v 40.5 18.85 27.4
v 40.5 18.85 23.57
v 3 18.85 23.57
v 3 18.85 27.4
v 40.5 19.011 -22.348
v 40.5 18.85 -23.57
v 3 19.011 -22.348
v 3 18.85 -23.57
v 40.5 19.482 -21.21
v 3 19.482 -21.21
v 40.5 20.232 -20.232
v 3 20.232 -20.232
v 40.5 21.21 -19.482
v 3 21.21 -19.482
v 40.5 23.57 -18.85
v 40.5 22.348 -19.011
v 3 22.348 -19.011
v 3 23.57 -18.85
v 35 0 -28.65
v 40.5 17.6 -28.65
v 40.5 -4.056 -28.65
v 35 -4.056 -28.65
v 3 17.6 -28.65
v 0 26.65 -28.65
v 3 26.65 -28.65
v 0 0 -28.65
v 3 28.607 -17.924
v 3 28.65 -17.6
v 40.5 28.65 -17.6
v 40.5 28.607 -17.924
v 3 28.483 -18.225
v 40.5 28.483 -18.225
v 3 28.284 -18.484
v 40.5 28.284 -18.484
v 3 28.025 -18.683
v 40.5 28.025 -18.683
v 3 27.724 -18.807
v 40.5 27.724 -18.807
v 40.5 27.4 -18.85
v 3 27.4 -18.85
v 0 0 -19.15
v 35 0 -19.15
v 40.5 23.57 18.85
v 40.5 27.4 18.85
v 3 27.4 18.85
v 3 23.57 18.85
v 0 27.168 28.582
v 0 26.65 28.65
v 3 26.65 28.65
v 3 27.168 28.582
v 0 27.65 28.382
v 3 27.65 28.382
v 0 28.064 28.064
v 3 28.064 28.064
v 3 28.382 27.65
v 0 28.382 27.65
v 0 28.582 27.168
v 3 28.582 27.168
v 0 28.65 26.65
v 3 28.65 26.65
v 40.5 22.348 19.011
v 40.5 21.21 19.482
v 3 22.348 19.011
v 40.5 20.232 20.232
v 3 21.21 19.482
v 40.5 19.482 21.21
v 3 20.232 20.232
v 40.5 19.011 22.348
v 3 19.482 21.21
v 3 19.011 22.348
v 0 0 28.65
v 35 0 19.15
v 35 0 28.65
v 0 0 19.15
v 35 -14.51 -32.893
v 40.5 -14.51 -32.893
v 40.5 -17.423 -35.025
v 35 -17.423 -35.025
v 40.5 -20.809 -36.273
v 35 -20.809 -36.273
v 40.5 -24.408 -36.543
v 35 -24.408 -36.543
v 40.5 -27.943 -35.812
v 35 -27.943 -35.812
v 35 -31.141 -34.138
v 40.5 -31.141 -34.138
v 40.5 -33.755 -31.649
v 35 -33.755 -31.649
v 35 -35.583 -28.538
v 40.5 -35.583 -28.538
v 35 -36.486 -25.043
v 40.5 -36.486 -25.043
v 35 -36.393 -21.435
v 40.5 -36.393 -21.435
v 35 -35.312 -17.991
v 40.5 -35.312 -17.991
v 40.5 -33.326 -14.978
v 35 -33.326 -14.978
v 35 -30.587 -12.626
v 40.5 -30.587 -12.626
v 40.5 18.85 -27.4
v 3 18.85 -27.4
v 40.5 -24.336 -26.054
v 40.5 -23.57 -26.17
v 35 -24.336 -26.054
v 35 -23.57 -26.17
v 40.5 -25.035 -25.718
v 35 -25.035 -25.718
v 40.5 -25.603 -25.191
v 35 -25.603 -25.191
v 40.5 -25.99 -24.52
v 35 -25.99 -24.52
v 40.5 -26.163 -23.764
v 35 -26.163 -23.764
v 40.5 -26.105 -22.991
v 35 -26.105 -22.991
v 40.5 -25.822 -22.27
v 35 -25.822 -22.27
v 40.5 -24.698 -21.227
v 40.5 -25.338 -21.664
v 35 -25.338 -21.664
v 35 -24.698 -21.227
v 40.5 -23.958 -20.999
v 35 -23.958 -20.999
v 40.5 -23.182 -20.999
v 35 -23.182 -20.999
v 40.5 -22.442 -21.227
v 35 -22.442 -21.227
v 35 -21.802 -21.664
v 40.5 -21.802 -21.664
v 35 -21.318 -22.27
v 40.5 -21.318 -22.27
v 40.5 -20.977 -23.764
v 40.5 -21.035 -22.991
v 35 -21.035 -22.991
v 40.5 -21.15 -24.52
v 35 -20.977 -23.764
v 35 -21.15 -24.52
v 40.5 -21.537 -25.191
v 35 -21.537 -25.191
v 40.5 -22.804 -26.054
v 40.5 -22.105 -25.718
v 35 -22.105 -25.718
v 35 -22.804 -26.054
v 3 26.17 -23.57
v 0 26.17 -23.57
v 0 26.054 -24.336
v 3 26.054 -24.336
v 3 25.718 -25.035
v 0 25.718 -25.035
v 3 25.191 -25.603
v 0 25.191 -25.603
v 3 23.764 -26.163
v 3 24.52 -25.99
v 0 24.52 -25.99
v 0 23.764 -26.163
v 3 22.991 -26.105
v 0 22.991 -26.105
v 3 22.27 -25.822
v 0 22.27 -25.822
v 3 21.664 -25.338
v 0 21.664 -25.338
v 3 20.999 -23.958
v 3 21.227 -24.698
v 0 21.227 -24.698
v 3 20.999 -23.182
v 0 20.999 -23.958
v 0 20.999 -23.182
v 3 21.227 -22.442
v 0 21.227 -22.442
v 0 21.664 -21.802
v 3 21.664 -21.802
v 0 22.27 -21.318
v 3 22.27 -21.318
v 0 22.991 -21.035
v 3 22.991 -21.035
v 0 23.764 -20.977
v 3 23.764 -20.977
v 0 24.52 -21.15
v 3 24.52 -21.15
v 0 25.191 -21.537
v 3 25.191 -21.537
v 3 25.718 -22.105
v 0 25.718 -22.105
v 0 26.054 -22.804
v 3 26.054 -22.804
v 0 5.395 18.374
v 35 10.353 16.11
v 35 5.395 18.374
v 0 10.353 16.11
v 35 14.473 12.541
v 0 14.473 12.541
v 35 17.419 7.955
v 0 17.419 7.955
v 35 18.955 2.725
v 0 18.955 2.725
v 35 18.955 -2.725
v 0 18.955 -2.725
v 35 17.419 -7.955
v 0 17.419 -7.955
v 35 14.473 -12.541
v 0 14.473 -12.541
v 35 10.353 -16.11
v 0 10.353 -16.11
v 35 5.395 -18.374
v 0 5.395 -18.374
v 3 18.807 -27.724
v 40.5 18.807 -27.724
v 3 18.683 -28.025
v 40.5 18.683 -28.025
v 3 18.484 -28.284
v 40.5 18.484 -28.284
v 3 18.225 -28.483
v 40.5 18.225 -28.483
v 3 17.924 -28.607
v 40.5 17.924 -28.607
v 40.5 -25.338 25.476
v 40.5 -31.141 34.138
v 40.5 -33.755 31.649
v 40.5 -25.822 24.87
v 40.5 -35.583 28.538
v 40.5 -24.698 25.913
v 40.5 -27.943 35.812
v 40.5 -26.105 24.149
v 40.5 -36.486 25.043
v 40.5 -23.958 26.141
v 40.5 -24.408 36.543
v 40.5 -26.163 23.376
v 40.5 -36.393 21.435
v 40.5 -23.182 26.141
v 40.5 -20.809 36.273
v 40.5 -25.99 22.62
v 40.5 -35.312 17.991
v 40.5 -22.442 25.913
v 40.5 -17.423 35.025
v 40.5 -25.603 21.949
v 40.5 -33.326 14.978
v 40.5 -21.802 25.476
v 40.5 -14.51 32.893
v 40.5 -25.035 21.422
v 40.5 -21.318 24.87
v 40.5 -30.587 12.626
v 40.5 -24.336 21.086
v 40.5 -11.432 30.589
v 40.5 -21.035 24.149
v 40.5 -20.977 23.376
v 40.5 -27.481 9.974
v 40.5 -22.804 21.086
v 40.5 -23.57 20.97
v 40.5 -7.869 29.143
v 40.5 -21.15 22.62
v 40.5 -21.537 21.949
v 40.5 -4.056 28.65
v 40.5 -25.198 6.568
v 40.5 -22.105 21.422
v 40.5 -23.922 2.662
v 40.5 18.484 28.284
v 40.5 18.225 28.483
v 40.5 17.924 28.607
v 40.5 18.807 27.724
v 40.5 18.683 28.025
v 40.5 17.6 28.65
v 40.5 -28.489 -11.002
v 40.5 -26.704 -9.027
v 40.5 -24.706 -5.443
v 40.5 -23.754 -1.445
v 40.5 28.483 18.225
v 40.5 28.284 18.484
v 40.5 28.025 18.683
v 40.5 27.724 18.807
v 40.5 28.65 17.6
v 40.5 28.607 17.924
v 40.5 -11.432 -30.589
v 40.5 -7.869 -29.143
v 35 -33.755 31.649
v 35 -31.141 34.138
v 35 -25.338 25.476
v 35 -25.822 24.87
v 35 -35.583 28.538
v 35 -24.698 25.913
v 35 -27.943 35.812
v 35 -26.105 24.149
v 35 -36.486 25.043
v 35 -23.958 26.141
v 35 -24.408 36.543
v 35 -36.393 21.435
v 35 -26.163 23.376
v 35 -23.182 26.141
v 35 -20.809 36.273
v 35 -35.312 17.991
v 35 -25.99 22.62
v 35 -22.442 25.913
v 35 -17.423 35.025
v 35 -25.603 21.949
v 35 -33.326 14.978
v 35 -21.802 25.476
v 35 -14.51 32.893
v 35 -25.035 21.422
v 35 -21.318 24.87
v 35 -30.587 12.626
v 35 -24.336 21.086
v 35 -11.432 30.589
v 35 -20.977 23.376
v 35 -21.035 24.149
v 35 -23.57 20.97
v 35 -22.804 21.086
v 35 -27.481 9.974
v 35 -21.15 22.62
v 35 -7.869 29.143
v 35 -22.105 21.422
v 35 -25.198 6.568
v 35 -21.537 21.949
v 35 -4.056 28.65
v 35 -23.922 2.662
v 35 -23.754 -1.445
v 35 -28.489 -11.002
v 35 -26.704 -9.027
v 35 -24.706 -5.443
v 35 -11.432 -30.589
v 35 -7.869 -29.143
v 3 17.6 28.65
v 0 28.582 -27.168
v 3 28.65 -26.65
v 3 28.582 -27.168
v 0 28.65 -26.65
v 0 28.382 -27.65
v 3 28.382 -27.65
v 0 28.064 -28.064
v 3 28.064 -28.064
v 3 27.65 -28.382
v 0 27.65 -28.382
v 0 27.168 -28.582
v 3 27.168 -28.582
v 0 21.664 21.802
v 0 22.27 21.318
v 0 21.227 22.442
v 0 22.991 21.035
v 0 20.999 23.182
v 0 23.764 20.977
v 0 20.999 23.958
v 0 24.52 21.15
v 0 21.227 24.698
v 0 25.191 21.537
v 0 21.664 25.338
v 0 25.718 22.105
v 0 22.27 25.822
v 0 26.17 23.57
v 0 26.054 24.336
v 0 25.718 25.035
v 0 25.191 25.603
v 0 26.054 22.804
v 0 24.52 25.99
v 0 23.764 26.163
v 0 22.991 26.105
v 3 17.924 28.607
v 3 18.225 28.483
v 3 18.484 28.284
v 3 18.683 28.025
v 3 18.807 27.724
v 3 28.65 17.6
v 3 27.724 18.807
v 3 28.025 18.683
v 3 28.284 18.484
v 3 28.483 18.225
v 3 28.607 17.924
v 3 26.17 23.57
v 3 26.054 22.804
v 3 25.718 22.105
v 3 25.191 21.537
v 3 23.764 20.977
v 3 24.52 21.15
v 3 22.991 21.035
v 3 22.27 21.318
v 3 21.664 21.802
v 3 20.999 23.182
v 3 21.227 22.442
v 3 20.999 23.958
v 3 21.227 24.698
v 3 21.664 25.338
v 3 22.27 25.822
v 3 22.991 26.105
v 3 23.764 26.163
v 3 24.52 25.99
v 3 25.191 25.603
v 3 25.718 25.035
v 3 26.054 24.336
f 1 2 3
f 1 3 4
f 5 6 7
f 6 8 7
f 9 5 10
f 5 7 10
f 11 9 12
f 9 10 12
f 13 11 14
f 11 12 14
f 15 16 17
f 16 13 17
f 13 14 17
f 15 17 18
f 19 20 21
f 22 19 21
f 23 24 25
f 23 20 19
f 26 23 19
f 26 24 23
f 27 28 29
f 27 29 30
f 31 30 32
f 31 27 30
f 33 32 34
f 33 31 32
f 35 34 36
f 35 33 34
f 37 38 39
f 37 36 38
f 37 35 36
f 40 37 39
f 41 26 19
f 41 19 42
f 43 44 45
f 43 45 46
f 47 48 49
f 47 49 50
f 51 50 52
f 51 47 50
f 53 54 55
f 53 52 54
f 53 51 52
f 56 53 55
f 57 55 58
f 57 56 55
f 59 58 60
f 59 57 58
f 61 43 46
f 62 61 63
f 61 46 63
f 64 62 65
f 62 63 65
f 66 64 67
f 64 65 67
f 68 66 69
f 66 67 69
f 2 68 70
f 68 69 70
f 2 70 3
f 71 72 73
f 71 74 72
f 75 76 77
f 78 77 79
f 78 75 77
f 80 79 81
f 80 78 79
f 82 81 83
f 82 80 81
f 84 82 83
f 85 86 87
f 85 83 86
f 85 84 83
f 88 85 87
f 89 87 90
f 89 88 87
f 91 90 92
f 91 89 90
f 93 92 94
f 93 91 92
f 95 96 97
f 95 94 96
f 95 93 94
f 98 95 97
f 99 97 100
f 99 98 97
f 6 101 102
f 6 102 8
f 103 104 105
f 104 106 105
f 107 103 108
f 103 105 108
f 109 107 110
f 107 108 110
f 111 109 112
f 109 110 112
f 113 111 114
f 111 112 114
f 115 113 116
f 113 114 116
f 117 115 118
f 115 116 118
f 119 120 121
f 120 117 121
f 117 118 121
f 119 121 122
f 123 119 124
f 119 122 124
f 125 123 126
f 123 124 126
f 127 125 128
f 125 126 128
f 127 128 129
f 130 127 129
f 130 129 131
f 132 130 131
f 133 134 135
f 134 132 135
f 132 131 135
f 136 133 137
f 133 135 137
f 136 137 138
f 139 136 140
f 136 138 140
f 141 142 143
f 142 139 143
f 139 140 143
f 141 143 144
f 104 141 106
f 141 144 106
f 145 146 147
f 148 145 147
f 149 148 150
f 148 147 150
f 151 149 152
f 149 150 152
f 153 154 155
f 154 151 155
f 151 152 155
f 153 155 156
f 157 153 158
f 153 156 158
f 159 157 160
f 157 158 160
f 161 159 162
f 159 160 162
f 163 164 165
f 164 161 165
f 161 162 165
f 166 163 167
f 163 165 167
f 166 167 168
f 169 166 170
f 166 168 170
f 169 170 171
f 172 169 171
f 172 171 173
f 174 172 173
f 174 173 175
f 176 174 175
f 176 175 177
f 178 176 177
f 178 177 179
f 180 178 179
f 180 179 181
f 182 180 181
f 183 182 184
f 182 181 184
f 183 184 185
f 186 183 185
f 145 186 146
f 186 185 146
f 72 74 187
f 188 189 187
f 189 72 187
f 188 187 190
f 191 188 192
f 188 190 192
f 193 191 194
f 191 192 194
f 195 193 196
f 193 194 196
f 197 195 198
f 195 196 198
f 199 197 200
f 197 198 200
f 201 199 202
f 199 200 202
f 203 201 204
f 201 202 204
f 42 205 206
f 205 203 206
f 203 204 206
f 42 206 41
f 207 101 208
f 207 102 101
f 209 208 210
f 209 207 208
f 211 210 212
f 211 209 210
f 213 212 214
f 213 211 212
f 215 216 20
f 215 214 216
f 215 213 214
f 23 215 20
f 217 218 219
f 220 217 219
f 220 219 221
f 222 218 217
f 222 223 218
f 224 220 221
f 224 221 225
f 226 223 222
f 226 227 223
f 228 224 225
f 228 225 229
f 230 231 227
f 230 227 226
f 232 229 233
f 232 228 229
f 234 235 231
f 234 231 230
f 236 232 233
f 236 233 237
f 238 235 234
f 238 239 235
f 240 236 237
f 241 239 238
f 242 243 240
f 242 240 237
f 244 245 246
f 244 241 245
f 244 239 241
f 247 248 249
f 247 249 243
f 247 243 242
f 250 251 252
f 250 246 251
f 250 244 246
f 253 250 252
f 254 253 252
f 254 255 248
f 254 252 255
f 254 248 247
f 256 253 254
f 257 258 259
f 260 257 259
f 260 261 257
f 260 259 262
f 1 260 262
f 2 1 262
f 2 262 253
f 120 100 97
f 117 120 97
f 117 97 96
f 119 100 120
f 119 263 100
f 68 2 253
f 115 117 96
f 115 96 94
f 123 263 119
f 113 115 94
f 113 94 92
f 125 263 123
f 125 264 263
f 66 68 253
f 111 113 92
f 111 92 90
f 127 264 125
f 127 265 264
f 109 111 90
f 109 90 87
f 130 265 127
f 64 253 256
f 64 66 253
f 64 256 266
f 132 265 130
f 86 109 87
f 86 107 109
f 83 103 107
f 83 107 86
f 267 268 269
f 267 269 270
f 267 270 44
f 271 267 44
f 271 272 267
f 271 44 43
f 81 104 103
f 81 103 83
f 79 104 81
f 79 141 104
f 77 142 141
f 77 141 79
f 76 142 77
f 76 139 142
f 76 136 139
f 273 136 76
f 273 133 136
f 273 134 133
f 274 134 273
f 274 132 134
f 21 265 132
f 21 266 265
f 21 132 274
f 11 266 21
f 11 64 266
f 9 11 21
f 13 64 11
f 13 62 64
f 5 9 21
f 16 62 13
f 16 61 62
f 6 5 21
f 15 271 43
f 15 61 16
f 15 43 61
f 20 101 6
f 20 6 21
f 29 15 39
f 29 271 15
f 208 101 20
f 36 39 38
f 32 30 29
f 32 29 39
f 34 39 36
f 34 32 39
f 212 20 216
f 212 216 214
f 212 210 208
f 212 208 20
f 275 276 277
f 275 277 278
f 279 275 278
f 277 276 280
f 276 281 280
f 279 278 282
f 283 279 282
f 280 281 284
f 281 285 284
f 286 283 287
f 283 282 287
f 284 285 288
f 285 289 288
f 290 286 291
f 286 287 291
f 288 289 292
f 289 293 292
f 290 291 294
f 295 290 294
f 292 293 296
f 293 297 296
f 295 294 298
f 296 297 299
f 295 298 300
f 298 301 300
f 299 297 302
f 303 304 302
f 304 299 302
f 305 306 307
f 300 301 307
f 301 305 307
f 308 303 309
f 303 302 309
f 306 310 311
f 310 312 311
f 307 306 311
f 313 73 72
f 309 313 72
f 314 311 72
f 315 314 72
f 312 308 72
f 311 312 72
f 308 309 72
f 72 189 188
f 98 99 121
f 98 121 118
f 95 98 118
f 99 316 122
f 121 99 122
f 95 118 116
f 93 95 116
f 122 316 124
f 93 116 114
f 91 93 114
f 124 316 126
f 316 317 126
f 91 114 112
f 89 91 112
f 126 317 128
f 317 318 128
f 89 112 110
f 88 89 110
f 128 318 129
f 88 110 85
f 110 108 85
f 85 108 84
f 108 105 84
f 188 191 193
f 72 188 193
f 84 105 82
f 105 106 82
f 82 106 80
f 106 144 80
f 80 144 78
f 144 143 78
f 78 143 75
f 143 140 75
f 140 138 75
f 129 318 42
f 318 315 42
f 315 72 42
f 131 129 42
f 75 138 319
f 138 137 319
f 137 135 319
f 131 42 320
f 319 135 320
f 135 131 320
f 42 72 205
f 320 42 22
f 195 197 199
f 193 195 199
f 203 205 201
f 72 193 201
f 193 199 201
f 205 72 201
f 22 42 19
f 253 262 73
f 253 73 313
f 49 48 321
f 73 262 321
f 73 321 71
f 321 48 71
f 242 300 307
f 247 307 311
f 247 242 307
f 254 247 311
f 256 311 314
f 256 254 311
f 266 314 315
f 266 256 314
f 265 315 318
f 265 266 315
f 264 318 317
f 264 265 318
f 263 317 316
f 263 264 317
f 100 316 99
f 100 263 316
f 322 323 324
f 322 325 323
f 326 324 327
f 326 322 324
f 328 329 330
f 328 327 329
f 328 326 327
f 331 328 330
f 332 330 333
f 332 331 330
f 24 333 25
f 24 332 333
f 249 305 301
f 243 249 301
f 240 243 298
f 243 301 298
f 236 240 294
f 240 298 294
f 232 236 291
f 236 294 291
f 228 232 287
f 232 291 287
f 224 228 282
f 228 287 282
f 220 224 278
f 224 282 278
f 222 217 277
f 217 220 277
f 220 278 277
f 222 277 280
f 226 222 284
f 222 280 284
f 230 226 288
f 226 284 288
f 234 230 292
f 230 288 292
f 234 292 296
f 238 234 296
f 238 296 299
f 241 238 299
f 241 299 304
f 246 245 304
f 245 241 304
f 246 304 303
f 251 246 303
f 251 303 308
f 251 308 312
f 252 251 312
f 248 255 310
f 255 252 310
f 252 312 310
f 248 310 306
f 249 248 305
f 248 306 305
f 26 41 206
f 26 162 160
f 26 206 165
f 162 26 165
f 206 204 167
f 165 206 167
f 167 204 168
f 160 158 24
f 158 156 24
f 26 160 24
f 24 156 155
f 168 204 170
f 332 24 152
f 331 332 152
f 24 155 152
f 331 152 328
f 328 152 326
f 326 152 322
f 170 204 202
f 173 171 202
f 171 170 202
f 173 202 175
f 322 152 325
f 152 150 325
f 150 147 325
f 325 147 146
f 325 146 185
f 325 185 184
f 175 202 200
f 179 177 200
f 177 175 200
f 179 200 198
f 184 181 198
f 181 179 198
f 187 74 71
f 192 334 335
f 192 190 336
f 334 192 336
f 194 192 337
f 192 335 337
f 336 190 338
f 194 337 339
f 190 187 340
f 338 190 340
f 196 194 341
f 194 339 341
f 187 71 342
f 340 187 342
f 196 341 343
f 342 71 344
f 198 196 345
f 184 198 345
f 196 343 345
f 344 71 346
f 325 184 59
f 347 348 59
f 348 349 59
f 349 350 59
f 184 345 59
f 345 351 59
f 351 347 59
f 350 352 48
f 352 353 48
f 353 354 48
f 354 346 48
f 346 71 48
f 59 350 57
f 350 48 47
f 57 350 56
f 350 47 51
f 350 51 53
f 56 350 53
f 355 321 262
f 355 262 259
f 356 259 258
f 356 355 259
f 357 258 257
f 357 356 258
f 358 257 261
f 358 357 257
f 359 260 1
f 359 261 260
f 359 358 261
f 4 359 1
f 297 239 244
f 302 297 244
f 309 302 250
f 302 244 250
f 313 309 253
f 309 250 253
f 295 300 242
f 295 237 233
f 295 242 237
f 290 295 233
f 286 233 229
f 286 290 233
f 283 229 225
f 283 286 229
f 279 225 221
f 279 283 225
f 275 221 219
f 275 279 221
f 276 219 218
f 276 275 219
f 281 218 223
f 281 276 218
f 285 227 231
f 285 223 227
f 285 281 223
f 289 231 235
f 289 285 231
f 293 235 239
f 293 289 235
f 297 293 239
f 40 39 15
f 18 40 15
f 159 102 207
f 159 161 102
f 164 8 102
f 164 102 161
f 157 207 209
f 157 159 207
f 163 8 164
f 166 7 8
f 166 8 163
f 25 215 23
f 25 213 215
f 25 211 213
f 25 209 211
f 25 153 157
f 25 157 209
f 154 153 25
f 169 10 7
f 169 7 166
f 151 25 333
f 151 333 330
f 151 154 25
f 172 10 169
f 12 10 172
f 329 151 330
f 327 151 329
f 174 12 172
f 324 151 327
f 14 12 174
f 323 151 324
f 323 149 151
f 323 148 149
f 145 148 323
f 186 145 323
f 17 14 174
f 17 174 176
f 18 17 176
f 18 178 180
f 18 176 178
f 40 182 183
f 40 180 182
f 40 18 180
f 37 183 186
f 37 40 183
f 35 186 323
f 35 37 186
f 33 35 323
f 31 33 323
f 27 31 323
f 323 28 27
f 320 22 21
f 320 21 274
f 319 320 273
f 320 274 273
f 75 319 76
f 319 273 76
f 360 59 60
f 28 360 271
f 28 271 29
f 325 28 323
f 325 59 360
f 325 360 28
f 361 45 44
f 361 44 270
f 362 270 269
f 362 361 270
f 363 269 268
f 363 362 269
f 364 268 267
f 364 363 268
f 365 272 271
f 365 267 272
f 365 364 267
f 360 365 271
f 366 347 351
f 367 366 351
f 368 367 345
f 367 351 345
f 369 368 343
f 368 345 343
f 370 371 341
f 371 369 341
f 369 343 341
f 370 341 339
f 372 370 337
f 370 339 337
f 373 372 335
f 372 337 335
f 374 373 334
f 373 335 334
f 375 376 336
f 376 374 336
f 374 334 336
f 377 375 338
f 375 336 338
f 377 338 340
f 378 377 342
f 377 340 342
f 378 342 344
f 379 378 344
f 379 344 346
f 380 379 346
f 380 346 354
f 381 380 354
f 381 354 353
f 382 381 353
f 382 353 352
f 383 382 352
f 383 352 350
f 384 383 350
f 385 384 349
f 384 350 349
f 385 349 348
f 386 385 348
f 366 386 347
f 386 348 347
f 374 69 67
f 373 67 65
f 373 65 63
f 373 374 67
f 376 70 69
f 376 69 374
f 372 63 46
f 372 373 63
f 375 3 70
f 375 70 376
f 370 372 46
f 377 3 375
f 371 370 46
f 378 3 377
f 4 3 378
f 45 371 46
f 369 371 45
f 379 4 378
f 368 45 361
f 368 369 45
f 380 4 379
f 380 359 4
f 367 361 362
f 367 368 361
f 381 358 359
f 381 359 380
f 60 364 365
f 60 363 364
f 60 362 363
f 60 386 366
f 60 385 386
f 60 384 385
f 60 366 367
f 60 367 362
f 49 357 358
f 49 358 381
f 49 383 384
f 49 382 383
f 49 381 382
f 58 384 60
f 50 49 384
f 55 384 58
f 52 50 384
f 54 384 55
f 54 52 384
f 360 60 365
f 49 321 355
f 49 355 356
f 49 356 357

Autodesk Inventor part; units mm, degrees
ref_plane "YZ Plane" through (0, 0, 0) normal (1, 0, 0) x (0, 1, 0)
ref_plane "XZ Plane" through (0, 0, 0) normal (0, 1, 0) x (-1, 0, 0)
ref_plane "XY Plane" through (0, 0, 0) normal (0, 0, 1) x (1, 0, 0)
sketch "Sketch1" plane through (0, 0, 0) normal (1, 0, 0) x (0, 1, 0)
  arc A0 (0, -19.15) -> (0, 19.15) centre (0, 0) ccw
  line L0 (0, 28.65) -> (26.65, 28.65)
  line L1 (28.65, 26.65) -> (28.65, -26.65)
  line L2 (26.65, -28.65) -> (0, -28.65)
  line L3 (0, -28.65) -> (0, -19.15)
  line L4 (0, 19.15) -> (0, 28.65)
  arc A1 (28.65, 26.65) -> (26.65, 28.65) centre (26.65, 26.65) ccw
  arc A2 (26.65, -28.65) -> (28.65, -26.65) centre (26.65, -26.65) ccw
  line L5 (0, 23.57) -> (23.57, 23.57) construction
  line L6 (23.57, 23.57) -> (23.57, -23.57) construction
  line L7 (23.57, -23.57) -> (0, -23.57) construction
  line L8 (0, -23.57) -> (0, 23.57) construction
  circle A3 centre (23.57, 23.57) radius 2.6
  circle A4 centre (23.57, -23.57) radius 2.6
  point P0 (28.65, -28.65)
  point P1 (28.65, 28.65)
  dimension "d0" = 38.3
  dimension "d1" = 28.65
  dimension "d2" = 57.3
  dimension "d3" = 28.65
  dimension "d4" = 2
  dimension "d5" = 23.57
  dimension "d6" = 47.14
  dimension "d7" = 23.57
  dimension "d8" = 5.2
  dimension "d9" = 5.2
extrude "Extrusion1" add sketch "Sketch1" along normal blind 3
sketch "Sketch2" plane through (3, 0, 0) normal (1, 0, 0) x (0, 0, -1)
  circle A0 centre (-23.57, 23.57) radius 2.6 projected
  circle A1 centre (23.57, 23.57) radius 2.6 projected
  circle A2 centre (-23.57, 23.57) radius 4.72
  circle A3 centre (23.57, 23.57) radius 4.72
  line L0 (26.65, 28.65) -> (-26.65, 28.65) projected
  line L1 (-28.65, 26.65) -> (-28.65, 0) projected
  line L2 (28.65, 0) -> (28.65, 26.65) projected
  line L3 (26.65, 28.65) -> (-26.65, 28.65) projected
  arc A4 (-26.65, 28.65) -> (-28.65, 26.65) centre (-26.65, 26.65) ccw projected
  line L4 (-28.65, 26.65) -> (-28.65, 0) projected
  line L5 (-28.65, 0) -> (-19.15, 0) projected
  arc A5 (19.15, 0) -> (-19.15, 0) centre (0, 0) ccw projected
  line L6 (19.15, 0) -> (28.65, 0) projected
  line L7 (28.65, 0) -> (28.65, 26.65) projected
  arc A6 (28.65, 26.65) -> (26.65, 28.65) centre (26.65, 26.65) ccw projected
  circle A7 centre (-23.57, 23.57) radius 2.6 projected
  circle A8 centre (23.57, 23.57) radius 2.6 projected
  line L8 (-18.85, 28.65) -> (-18.85, 23.57)
  line L9 (-28.65, 18.85) -> (-23.57, 18.85)
  line L10 (18.85, 28.65) -> (18.85, 23.57)
  line L11 (28.65, 18.85) -> (23.57, 18.85)
  arc A9 (-17.6, 28.65) -> (-18.85, 27.4) centre (-17.6, 27.4) ccw
  arc A10 (-27.4, 18.85) -> (-28.65, 17.6) centre (-27.4, 17.6) ccw
  arc A11 (18.85, 27.4) -> (17.6, 28.65) centre (17.6, 27.4) ccw
  arc A12 (28.65, 17.6) -> (27.4, 18.85) centre (27.4, 17.6) ccw
  point P0 (-2.4769, -5.2226)
  point P1 (-57.3, 46.4)
  point P2 (-57.3, 10.9)
  point P3 (0, 10.9)
  point P4 (0, 46.4)
  point P5 (-10.9124, 57.3)
  point P6 (-46.3876, 57.3)
  dimension "d34" = 2.12
  dimension "d35" = 2.12
  dimension "d36" = 2.5
  dimension "d37" = 2.5
  dimension "d38" = 2.5
  dimension "d39" = 2.5
extrude "Extrusion2" add sketch "Sketch2" along normal blind 32 contours L8 A9 L0 A11 L10 A3 L11 A12 L2 L6 A5 L5 L1 A10 L9 A2
sketch "Sketch3" plane through (35, 0, 0) normal (1, 0, 0) x (0, 0, -1)
  circle A0 centre (-23.57, 23.57) radius 2.6 construction
  line L0 (-23.57, 23.57) -> (23.57, 23.57) construction
  line L1 (23.57, 23.57) -> (23.57, -23.57) construction
  line L2 (23.57, -23.57) -> (-23.57, -23.57) construction
  line L3 (-23.57, -23.57) -> (-23.57, 23.57) construction
  circle A1 centre (-23.57, -23.57) radius 2.6
  circle A2 centre (23.57, -23.57) radius 2.6
  arc A3 (-26.65, 28.65) -> (-28.65, 26.65) centre (-26.65, 26.65) ccw projected
  line L4 (-17.6, 28.65) -> (-26.65, 28.65) projected
  line L5 (17.6, 28.65) -> (-17.6, 28.65) projected
  line L6 (26.65, 28.65) -> (17.6, 28.65) projected
  arc A4 (28.65, 26.65) -> (26.65, 28.65) centre (26.65, 26.65) ccw projected
  line L7 (0, 0) -> (-7.096, 0) construction
  arc A5 (-28.65, -26.65) -> (-26.65, -28.65) centre (-26.65, -26.65) ccw
  line L8 (-20.0479, -28.65) -> (-26.65, -28.65)
  line L9 (26.65, -28.65) -> (20.0479, -28.65)
  arc A6 (26.65, -28.65) -> (28.65, -26.65) centre (26.65, -26.65) ccw
  line L10 (-28.65, 0) -> (-19.15, 0) projected
  line L11 (19.15, 0) -> (28.65, 0) projected
  line L12 (-28.65, 0) -> (-19.15, 0) projected
  line L13 (-28.65, 0) -> (-28.65, -26.65)
  line L14 (28.65, 0) -> (28.65, 17.6) projected
  line L15 (28.65, 0) -> (28.65, -26.65)
  arc A7 (16.0392, -27.1143) -> (-16.0392, -27.1143) centre (0, -44.9767) ccw
  arc A8 (-20.0479, -28.65) -> (-16.0392, -27.1143) centre (-20.0479, -22.65) ccw
  arc A9 (16.0392, -27.1143) -> (20.0479, -28.65) centre (20.0479, -22.65) ccw
  arc A10 (19.15, 0) -> (-19.15, 0) centre (0, 0) ccw projected
  line L16 (19.15, 0) -> (28.65, 0) projected
  line L17 (28.65, 0) -> (28.65, 17.6) projected
  arc A11 (28.65, 17.6) -> (27.4, 18.85) centre (27.4, 17.6) ccw projected
  line L18 (27.4, 18.85) -> (23.57, 18.85) projected
  arc A12 (18.85, 23.57) -> (23.57, 18.85) centre (23.57, 23.57) ccw projected
  line L19 (18.85, 23.57) -> (18.85, 27.4) projected
  arc A13 (18.85, 27.4) -> (17.6, 28.65) centre (17.6, 27.4) ccw projected
  line L20 (17.6, 28.65) -> (-17.6, 28.65) projected
  arc A14 (-17.6, 28.65) -> (-18.85, 27.4) centre (-17.6, 27.4) ccw projected
  line L21 (-18.85, 27.4) -> (-18.85, 23.57) projected
  arc A15 (-23.57, 18.85) -> (-18.85, 23.57) centre (-23.57, 23.57) ccw projected
  line L22 (-23.57, 18.85) -> (-27.4, 18.85) projected
  arc A16 (-27.4, 18.85) -> (-28.65, 17.6) centre (-27.4, 17.6) ccw projected
  line L23 (-28.65, 17.6) -> (-28.65, 0) projected
  line L24 (-28.65, 0) -> (-19.15, 0) projected
  circle A17 centre (23.57, -23.57) radius 13
  circle A18 centre (-23.57, -23.57) radius 13
  point P0 (-17.6, -28.65)
  point P1 (17.6, -28.65)
  point P2 (10.5708, -23.4226)
  point P3 (28.65, -11.6036)
  point P4 (-28.65, -11.6036)
  point P5 (-10.5708, -23.4226)
  dimension "d42" = 47.14
  dimension "d43" = 47.14
  dimension "d44" = 5.2
  dimension "d45" = 5.2
  dimension "d46" = 6
  dimension "d49" = 26
  dimension "d50" = 26
extrude "Extrusion3" add sketch "Sketch3" along normal blind 5.5
fillet "Fillet1" radius 15 4 edges at (37.75, -11.6036, 28.65) (37.75, -11.6036, -28.65) (37.75, -23.4226, 10.5708) (37.75, -23.4226, -10.5708)
equation "\"d3\" = 0.5 * d2"
equation "\"d7\" = d5"
equation "\"d9\" = d8"
equation "\"d37\" = d36"
equation "\"d38\" = d36"
equation "\"d39\" = d36"
properties part number "X Axis Pully Support"
